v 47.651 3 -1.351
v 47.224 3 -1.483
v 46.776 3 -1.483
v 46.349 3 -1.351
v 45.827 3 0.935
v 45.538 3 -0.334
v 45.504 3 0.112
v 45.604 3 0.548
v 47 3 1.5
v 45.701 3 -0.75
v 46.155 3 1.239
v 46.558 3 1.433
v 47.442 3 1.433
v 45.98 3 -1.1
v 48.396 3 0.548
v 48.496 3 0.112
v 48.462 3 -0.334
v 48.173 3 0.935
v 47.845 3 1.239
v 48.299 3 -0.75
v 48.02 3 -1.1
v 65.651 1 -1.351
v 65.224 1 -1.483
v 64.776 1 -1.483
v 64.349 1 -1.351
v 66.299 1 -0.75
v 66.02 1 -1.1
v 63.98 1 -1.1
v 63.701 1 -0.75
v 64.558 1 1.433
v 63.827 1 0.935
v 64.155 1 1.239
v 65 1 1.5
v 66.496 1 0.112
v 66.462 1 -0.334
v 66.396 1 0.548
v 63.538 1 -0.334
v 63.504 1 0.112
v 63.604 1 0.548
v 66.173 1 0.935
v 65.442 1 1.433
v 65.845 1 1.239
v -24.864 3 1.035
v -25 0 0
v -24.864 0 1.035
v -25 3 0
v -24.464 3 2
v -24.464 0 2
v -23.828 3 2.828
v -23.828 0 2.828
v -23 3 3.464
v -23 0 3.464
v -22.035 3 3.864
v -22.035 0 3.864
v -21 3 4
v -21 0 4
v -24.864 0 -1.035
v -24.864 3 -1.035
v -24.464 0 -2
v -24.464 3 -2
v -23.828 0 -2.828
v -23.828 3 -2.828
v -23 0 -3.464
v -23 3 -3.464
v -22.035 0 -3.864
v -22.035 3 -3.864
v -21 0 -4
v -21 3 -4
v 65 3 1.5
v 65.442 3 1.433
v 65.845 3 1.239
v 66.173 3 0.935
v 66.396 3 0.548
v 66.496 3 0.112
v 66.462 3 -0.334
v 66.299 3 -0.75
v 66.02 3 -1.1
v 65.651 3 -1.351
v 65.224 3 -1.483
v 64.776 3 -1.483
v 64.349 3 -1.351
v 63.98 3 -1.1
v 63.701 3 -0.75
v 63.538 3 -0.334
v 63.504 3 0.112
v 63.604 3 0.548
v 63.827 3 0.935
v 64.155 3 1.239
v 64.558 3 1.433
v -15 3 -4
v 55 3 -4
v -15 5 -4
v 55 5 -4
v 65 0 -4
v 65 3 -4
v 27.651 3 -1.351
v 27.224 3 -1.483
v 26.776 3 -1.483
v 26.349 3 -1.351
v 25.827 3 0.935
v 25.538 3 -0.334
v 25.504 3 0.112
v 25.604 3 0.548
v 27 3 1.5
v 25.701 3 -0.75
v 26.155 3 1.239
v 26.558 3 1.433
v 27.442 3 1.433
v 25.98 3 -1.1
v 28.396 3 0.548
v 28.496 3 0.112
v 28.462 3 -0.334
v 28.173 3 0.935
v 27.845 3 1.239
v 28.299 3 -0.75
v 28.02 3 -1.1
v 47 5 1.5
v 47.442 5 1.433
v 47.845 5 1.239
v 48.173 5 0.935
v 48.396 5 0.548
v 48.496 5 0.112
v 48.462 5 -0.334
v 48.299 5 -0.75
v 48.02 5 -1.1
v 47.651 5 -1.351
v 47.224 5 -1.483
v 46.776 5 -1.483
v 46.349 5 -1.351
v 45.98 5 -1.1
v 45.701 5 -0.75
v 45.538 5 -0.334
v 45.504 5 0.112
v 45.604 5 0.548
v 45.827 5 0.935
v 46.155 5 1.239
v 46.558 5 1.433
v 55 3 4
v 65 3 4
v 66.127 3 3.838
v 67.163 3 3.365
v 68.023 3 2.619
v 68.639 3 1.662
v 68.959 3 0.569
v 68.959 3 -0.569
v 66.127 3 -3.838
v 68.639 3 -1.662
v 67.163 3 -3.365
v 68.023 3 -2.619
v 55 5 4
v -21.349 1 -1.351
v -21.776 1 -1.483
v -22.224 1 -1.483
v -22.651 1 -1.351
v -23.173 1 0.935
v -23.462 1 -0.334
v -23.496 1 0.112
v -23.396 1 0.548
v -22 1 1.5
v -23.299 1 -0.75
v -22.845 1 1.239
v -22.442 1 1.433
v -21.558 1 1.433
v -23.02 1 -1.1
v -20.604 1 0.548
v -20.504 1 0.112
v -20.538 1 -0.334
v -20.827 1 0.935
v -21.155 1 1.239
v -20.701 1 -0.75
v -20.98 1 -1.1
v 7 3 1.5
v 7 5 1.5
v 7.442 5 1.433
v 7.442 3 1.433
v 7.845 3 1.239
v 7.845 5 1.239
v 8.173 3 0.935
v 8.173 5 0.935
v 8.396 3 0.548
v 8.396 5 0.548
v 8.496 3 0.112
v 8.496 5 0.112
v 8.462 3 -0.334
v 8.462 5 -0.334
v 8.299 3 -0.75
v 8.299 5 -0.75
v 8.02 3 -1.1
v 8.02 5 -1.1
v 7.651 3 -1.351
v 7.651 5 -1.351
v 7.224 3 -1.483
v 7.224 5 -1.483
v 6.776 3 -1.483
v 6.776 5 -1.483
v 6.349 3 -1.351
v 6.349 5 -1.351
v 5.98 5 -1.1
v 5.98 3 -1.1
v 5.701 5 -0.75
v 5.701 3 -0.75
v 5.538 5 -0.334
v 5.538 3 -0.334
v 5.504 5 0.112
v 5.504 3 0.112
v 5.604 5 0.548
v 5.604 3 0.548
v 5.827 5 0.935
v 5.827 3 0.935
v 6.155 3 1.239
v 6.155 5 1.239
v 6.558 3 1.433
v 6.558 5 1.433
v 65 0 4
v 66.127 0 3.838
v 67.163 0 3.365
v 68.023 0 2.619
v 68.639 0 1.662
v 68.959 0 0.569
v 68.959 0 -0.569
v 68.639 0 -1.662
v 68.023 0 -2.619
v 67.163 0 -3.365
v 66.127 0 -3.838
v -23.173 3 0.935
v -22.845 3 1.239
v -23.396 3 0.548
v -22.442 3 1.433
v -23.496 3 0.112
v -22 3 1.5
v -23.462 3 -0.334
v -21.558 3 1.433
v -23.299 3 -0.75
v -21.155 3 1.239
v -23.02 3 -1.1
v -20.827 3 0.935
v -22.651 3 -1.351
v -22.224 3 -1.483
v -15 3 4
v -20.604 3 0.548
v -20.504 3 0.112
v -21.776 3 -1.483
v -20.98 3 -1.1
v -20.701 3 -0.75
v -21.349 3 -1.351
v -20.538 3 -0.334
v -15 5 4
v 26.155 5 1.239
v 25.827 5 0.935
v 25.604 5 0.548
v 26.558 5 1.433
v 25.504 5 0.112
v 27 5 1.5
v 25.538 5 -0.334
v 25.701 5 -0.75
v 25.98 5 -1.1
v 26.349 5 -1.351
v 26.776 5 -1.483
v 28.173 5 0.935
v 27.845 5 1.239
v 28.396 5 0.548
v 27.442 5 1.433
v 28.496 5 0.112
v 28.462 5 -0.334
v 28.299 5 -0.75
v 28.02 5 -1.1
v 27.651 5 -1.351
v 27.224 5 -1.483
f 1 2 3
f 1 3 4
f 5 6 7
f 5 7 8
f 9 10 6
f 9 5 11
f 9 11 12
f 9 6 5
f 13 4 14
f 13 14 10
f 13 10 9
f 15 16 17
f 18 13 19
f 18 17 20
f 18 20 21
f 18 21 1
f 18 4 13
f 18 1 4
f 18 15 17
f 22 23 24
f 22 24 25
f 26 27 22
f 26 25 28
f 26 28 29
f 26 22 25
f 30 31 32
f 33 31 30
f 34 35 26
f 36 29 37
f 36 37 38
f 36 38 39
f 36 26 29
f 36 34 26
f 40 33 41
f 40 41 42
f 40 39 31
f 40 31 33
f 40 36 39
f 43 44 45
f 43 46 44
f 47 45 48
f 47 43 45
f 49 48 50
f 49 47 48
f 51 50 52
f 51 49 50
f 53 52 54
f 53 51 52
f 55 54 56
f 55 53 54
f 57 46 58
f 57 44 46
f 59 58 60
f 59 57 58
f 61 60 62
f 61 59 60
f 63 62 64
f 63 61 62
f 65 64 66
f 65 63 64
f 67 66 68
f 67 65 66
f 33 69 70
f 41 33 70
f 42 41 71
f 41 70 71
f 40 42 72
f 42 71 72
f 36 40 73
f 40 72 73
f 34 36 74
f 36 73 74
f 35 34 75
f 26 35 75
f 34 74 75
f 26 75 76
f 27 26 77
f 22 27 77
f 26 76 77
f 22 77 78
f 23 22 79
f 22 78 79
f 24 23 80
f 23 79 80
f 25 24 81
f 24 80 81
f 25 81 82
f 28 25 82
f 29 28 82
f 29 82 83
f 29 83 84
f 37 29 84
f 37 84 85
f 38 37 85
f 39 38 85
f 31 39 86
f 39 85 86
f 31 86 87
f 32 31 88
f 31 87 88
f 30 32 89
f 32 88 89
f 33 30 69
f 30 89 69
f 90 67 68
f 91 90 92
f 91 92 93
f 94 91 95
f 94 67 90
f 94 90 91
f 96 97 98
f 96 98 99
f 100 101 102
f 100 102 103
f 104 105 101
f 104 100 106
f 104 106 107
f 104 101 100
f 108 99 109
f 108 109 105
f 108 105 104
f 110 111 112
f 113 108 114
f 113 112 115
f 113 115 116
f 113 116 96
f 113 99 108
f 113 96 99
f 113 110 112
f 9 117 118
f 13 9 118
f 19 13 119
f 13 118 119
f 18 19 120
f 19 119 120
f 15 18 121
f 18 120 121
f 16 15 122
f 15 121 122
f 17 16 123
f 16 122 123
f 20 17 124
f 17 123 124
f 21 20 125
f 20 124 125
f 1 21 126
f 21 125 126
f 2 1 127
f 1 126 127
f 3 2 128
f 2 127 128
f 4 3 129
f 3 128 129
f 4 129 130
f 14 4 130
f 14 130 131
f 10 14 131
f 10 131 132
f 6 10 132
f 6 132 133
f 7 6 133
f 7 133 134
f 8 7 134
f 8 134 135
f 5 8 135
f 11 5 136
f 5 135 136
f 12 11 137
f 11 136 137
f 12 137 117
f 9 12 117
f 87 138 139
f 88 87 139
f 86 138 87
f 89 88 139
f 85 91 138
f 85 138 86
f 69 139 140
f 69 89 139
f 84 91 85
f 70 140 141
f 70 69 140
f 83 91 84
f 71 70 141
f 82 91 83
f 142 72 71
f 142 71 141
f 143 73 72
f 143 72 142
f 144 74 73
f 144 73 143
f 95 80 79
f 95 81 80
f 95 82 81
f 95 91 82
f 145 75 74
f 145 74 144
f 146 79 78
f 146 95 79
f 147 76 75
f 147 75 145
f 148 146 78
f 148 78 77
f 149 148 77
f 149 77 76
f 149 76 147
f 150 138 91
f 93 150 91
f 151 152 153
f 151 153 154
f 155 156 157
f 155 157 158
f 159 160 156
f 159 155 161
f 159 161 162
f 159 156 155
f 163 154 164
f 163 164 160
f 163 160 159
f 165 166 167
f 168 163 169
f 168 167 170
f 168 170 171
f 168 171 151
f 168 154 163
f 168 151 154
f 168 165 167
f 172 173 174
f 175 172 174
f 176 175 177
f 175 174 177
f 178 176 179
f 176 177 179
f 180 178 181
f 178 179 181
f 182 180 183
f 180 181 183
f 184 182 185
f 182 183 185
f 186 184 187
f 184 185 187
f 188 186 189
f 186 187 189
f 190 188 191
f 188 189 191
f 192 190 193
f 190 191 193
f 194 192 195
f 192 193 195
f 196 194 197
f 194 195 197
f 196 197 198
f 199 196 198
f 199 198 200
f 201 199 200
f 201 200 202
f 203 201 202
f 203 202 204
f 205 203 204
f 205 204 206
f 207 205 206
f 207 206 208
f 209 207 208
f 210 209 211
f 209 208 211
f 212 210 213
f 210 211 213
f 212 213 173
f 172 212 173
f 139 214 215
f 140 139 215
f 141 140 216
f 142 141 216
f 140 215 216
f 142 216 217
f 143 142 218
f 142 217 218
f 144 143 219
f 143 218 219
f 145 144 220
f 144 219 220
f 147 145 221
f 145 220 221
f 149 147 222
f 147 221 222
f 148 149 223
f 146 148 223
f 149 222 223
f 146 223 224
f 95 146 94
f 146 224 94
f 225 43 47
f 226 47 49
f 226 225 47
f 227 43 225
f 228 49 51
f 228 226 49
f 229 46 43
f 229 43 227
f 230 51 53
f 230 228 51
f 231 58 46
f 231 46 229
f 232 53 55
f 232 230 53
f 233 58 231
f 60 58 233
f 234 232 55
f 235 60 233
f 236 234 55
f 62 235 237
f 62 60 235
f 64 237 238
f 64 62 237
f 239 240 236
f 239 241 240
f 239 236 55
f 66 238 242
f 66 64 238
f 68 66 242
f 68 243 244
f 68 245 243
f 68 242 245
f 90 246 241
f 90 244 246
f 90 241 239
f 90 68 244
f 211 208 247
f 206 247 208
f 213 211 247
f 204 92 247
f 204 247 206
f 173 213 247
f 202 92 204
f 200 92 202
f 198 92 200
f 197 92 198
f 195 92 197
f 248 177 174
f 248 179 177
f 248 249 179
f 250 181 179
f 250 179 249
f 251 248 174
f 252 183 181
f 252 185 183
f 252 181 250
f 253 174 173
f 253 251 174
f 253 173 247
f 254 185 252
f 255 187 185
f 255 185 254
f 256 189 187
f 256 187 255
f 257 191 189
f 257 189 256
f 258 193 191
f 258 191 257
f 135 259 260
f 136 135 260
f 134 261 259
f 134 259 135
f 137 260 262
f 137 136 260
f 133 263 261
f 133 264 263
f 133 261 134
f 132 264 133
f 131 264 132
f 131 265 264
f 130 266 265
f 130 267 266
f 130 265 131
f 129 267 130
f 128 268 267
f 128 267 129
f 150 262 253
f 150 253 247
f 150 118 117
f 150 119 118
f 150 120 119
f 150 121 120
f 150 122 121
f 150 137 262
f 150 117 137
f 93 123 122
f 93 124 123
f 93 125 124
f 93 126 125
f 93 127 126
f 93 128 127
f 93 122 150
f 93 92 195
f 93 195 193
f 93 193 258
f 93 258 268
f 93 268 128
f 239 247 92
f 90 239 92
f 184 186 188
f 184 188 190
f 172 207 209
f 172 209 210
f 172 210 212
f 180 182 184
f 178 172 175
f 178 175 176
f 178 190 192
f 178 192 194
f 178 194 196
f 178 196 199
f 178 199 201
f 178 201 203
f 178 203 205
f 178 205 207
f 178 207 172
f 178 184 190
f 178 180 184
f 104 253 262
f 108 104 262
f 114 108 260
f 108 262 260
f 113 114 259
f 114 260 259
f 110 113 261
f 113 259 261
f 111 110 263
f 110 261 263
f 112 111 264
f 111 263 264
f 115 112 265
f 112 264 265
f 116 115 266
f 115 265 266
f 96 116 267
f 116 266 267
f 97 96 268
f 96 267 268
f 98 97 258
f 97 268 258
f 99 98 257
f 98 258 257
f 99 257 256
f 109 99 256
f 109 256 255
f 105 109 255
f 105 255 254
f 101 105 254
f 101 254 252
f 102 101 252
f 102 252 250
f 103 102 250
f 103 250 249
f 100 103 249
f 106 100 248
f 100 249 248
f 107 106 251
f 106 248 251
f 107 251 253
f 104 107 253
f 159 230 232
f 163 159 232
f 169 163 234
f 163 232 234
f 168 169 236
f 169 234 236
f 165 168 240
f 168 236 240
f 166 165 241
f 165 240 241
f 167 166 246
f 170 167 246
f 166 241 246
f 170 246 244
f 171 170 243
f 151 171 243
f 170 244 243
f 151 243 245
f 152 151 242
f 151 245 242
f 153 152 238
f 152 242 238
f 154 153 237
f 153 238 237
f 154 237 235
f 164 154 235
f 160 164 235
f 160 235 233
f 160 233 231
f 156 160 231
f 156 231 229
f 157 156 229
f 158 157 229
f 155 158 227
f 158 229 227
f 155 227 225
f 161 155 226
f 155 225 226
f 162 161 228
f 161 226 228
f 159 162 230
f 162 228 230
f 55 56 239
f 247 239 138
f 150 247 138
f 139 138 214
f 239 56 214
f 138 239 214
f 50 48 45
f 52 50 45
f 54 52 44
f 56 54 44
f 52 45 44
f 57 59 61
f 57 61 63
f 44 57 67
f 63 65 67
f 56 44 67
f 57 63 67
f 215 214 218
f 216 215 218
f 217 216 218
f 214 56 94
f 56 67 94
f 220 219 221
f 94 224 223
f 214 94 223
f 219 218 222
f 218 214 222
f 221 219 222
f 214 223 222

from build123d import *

# Parameters (mm, degrees)
BOSS_EXTRUDE2_DEPTH = 3
SKETCH3_W           = 80
SKETCH3_H           = 8
BOSS_EXTRUDE3_DEPTH = 2
SKETCH4_R           = 1.5
CUT_EXTRUDE5_DEPTH  = 2
SKETCH12_R          = 1.5
CUT_EXTRUDE6_DEPTH  = 2
SKETCH16_W          = 10
SKETCH16_H          = 8
CUT_EXTRUDE7_DEPTH  = 2
SKETCH17_R          = 1.5
CUT_EXTRUDE8_DEPTH  = 2
FILLET1_R           = 4


with BuildPart() as part:
    # Sketch1 → Boss-Extrude2 (new body)
    with BuildSketch(Plane(origin=(0, 0, 0), x_dir=(1, 0, 0), z_dir=(0, 1, 0))):
        with BuildLine():
            Line((-25, -4), (65, -4))
            ThreePointArc((65, -4), (69, 0), (65, 4))
            Line((65, 4), (-25, 4))
            Line((-25, 4), (-25, -4))
        make_face()
    extrude(amount=BOSS_EXTRUDE2_DEPTH)

    # Sketch3 → Boss-Extrude3 (add)
    with BuildSketch(Plane(origin=(0, 3, 0), x_dir=(1, 0, 0), z_dir=(0, 1, 0))):
        with Locations((15, 0)):
            Rectangle(SKETCH3_W, SKETCH3_H)
    extrude(amount=BOSS_EXTRUDE3_DEPTH)

    # Sketch4 → Cut-Extrude5 (cut)
    with BuildSketch(Plane(origin=(0, 3, 0), x_dir=(1, 0, 0), z_dir=(0, 1, 0))):
        with Locations(Location((65, 0, 0), (0, 0, 270))):
            Circle(SKETCH4_R)
    extrude(amount=-CUT_EXTRUDE5_DEPTH, mode=Mode.SUBTRACT)

    # Sketch12 → Cut-Extrude6 (cut)
    with BuildSketch(Plane(origin=(0, 5, 0), x_dir=(1, 0, 0), z_dir=(0, 1, 0))):
        with Locations(Location((47, 0, 0), (0, 0, 270))):
            Circle(SKETCH12_R)
        with Locations(Location((27, 0, 0), (0, 0, 270))):
            Circle(SKETCH12_R)
        with Locations(Location((7, 0, 0), (0, 0, 270))):
            Circle(SKETCH12_R)
    extrude(amount=-CUT_EXTRUDE6_DEPTH, mode=Mode.SUBTRACT)

    # Sketch16 → Cut-Extrude7 (cut)
    with BuildSketch(Plane(origin=(0, 5, 0), x_dir=(1, 0, 0), z_dir=(0, 1, 0))):
        with Locations((-20, 0)):
            Rectangle(SKETCH16_W, SKETCH16_H)
    extrude(amount=-CUT_EXTRUDE7_DEPTH, mode=Mode.SUBTRACT)

    # Sketch17 → Cut-Extrude8 (cut)
    with BuildSketch(Plane(origin=(0, 3, 0), x_dir=(1, 0, 0), z_dir=(0, 1, 0))):
        with Locations(Location((-22, 0, 0), (0, 0, 270))):
            Circle(SKETCH17_R)
    extrude(amount=-CUT_EXTRUDE8_DEPTH, mode=Mode.SUBTRACT)

    # Fillet1
    fillet1_edges = [part.edges().sort_by_distance(p)[0] for p in [
        (-25, 1.5, -4),
        (-25, 1.5, 4),
    ]]
    fillet(fillet1_edges, radius=FILLET1_R - 0.0001)  # a hair under: the kernel refuses the full size


solid = part.part
